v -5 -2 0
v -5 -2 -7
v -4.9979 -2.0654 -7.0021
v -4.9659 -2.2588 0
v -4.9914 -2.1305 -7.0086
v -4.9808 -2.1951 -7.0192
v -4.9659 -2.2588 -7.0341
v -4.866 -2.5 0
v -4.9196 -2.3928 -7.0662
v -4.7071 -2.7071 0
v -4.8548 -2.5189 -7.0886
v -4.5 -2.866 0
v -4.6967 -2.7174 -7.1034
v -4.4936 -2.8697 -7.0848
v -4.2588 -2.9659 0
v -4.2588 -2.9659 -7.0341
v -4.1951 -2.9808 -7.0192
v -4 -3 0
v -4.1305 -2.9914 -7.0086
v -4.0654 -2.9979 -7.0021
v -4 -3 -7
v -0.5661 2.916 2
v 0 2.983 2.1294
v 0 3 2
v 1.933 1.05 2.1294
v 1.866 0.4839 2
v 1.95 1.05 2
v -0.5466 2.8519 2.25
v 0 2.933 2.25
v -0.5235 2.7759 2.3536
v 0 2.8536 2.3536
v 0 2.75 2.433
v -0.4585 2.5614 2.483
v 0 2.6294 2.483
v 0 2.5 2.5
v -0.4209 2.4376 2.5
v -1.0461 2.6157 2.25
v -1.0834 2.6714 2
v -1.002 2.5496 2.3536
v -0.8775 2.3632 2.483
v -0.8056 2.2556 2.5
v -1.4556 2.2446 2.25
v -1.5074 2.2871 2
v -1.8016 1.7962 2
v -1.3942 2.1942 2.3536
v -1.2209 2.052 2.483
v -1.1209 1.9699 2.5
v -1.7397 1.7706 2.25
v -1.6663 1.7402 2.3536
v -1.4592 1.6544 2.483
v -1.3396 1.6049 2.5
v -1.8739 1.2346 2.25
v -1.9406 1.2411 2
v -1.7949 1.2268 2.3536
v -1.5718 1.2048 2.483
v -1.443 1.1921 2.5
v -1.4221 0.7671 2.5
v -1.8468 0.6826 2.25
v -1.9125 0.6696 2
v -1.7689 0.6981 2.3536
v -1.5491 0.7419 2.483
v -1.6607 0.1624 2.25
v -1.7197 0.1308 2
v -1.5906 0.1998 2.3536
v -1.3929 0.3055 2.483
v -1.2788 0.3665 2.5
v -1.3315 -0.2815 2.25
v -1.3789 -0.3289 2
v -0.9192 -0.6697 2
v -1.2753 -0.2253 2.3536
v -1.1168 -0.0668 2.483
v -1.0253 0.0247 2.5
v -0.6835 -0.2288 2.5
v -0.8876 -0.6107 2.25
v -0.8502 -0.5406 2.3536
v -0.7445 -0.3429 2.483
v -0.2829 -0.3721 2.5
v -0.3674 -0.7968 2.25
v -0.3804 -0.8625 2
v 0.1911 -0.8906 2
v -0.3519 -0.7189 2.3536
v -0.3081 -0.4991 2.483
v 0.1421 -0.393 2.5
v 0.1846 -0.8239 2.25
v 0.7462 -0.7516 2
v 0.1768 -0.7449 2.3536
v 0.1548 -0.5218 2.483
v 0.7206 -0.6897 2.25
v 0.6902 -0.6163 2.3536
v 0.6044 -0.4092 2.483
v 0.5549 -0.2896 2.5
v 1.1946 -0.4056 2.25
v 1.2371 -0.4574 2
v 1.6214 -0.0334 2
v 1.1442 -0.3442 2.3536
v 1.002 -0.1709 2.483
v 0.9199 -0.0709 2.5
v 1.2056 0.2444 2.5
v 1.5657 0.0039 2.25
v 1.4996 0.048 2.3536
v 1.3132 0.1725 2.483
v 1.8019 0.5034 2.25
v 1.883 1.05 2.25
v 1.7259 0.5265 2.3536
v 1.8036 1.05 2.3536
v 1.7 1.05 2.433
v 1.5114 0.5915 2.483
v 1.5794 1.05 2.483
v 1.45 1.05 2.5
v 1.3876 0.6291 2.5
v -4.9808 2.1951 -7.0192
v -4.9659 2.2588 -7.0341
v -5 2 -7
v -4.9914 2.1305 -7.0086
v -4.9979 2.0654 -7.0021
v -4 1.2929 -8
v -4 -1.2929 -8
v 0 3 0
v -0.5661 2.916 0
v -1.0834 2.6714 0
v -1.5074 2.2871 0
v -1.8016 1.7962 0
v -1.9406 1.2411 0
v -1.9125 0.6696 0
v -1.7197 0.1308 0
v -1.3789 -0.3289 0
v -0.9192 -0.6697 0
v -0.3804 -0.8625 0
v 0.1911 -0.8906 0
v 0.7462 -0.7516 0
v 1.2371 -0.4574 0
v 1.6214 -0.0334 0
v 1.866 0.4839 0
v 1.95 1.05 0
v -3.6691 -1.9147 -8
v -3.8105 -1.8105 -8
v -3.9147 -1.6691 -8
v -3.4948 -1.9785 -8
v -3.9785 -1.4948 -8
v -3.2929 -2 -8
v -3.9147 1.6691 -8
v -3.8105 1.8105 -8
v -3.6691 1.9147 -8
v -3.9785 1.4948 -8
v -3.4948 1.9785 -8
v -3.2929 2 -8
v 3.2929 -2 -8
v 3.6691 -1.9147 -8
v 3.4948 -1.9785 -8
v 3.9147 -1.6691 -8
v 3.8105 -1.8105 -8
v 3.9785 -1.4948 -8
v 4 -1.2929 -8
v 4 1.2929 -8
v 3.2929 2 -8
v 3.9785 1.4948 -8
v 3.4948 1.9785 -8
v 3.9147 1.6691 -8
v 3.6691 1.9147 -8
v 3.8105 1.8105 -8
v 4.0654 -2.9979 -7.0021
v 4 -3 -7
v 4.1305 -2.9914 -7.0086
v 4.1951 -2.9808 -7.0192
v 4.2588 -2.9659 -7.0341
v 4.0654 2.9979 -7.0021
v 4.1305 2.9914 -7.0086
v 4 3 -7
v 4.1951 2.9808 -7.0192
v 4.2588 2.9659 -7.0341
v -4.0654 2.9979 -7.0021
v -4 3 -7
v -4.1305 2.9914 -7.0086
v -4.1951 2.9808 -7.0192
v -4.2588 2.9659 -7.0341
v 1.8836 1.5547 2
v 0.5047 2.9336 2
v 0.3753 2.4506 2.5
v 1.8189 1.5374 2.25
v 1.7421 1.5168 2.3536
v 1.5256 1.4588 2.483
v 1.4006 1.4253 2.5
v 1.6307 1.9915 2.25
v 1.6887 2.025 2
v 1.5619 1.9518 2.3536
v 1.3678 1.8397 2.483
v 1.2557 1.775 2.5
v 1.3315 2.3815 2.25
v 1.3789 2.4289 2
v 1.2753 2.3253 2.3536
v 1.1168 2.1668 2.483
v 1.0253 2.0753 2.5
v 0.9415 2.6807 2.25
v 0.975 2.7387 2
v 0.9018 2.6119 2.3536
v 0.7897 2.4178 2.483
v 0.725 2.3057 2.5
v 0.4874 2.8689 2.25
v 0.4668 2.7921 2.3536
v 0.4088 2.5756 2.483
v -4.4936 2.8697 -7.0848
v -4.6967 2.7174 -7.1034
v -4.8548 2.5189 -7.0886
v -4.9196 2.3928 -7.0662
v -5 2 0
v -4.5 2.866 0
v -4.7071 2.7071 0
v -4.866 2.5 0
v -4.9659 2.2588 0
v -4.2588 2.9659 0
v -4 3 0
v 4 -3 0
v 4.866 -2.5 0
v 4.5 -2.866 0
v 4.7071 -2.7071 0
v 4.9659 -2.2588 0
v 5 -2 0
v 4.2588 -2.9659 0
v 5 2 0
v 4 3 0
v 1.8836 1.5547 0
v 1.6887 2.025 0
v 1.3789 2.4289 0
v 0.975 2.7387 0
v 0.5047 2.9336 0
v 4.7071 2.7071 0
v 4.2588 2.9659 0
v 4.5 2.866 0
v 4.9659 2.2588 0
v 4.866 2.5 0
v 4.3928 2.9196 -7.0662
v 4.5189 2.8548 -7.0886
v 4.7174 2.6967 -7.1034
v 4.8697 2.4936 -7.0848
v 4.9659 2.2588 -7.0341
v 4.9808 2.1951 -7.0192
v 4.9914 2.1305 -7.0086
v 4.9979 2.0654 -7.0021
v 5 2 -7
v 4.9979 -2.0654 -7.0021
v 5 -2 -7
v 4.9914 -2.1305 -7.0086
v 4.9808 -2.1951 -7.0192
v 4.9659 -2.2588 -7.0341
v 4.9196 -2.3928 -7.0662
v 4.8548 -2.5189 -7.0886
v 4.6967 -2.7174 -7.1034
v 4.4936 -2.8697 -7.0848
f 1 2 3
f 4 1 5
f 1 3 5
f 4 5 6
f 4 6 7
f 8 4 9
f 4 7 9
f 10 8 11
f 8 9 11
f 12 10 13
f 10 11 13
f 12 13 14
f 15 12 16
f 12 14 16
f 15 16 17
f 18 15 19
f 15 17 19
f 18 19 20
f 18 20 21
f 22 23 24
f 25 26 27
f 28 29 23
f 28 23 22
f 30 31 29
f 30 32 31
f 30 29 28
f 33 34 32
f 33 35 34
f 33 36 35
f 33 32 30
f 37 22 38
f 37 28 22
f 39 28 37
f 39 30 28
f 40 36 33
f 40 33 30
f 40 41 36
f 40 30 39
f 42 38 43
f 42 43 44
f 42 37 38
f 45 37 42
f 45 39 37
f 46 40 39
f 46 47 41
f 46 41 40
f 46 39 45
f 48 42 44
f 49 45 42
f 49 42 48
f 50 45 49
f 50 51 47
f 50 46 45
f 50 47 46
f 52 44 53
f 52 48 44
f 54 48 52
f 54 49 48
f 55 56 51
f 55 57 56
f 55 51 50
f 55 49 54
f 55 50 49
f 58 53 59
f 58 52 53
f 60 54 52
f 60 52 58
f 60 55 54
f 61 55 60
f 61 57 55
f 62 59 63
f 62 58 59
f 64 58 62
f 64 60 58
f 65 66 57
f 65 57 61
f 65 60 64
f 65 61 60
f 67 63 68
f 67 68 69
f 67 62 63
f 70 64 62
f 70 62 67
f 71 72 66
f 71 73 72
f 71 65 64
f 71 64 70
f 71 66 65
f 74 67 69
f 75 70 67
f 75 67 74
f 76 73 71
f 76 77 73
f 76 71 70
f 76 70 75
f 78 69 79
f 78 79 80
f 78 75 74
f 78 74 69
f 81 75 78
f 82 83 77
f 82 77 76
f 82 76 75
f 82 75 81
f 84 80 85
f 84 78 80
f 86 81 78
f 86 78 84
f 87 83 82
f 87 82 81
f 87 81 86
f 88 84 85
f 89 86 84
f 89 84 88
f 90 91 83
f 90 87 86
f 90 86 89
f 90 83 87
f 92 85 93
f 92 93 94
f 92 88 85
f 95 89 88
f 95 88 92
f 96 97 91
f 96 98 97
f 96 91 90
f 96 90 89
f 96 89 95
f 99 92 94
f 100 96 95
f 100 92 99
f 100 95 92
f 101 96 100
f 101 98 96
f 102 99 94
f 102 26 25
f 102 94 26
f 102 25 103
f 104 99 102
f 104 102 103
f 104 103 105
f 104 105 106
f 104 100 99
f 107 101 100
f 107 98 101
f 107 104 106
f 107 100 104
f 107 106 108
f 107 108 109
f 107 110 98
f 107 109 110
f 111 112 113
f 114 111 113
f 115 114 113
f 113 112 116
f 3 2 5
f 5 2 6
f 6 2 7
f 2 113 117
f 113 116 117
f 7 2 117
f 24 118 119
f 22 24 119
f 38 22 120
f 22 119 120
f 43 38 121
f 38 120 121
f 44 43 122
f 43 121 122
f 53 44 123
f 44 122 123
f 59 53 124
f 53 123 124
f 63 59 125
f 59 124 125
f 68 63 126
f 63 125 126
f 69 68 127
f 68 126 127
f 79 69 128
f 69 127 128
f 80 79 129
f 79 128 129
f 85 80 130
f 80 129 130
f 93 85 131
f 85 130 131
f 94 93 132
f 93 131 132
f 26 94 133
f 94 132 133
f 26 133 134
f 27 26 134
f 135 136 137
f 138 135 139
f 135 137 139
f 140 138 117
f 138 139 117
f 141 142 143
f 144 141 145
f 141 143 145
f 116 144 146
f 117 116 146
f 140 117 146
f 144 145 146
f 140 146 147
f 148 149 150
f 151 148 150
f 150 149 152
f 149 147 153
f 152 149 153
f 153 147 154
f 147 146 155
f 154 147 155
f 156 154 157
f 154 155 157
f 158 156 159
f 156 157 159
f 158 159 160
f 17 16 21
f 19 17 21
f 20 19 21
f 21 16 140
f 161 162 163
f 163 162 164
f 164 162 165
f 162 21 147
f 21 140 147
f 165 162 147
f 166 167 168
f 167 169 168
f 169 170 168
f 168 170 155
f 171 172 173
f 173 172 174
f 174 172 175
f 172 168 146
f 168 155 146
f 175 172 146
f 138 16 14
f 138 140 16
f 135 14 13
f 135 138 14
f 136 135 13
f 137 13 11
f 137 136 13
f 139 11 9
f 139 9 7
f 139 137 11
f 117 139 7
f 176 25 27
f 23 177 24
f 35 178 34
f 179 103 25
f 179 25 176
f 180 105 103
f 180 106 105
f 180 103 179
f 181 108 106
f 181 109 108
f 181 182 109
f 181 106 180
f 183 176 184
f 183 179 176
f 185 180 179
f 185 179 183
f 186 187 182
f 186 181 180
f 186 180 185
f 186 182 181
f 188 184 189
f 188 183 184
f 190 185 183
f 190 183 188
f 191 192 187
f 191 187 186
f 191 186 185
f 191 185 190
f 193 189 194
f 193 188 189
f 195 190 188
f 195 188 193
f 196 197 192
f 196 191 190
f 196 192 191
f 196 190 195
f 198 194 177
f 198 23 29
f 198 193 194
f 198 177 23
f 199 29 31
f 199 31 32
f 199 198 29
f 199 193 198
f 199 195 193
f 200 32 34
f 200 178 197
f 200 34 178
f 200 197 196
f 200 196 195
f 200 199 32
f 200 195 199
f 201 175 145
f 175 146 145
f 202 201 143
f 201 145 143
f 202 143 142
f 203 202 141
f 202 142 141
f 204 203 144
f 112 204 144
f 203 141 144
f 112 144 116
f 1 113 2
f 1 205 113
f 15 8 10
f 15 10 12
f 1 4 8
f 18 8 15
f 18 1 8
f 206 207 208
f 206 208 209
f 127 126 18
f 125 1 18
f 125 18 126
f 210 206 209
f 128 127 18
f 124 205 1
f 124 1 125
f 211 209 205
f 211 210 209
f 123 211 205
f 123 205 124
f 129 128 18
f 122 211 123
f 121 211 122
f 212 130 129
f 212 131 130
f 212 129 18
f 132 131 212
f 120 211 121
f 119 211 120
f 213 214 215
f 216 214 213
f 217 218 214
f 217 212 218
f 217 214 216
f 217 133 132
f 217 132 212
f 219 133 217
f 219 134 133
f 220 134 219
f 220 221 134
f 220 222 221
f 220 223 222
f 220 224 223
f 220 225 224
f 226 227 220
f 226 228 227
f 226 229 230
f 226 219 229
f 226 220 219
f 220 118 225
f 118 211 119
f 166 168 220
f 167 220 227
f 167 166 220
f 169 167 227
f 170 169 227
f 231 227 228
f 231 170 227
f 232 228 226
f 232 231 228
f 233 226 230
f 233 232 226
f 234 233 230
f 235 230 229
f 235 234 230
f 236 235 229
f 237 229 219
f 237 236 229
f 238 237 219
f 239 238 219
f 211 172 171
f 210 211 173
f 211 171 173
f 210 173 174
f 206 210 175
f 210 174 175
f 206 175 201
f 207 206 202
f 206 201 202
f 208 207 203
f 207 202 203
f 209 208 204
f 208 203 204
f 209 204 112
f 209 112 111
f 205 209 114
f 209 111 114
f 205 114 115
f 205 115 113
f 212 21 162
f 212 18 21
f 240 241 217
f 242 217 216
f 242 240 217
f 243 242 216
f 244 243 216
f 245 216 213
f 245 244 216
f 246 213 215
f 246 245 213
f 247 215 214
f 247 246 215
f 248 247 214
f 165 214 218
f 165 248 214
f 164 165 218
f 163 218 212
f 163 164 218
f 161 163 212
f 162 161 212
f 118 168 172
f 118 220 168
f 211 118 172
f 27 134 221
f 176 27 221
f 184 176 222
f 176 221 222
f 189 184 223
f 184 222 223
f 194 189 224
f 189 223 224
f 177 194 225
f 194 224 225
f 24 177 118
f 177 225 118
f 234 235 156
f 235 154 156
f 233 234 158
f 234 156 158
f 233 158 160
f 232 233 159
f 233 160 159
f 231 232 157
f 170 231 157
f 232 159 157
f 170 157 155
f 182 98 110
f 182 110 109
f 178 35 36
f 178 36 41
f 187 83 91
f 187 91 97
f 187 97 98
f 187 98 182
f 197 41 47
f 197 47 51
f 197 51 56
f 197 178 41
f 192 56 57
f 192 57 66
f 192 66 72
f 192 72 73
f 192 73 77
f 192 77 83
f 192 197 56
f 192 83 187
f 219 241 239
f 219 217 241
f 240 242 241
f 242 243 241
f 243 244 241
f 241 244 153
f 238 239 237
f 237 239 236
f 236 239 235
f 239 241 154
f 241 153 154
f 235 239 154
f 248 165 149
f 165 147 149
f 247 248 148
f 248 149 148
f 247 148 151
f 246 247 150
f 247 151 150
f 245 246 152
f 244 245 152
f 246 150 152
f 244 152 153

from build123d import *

# Parameters (mm, degrees)
F1_DEPTH = 8
F2_DEPTH = 2.5
F3_R     = 0.5
F4_SIZE  = 1
F5_F1_R  = 1
F5_F2_R  = 1
F5_F3_R  = 1
F5_F4_R  = 1
F5_F5_R  = 1
F5_F6_R  = 1
F5_F7_R  = 1
F5_F8_R  = 1


with BuildPart() as f1:
    # F0 (on Top) → F1 (new body)
    with BuildSketch(Plane.XY):
        Polygon((-5, -3), (5, -3), (5, 3), (0, 3), (-5, 3), align=None)
        with BuildLine():
            ThreePointArc((1.95, 1.05), (-1.3788582233, -0.3288582233), (0, 3))
            ThreePointArc((0, 3), (1.3788582233, 2.4288582233), (1.95, 1.05))
        make_face(mode=Mode.SUBTRACT)
        with BuildLine():
            ThreePointArc((1.95, 1.05), (1.3788582233, 2.4288582233), (0, 3))
            ThreePointArc((0, 3), (-1.3788582233, -0.3288582233), (1.95, 1.05))
        make_face()
    extrude(amount=-F1_DEPTH)

    # F0 (on Top) → F2 (join)
    with BuildSketch(Plane.XY):
        with BuildLine():
            ThreePointArc((1.95, 1.05), (1.3788582233, 2.4288582233), (0, 3))
            ThreePointArc((0, 3), (-1.3788582233, -0.3288582233), (1.95, 1.05))
        make_face()
    extrude(amount=F2_DEPTH)

    # F3
    f3_edges = [f1.edges().sort_by_distance(p)[0] for p in [
        (-1.95, 1.05, 2.5),
    ]]
    fillet(f3_edges, radius=F3_R)

    # F4
    f4_edges = [f1.edges().sort_by_distance(p)[0] for p in [
        (-5, 0, -8),
        (0, -3, -8),
        (0, 3, -8),
        (5, 0, -8),
    ]]
    chamfer(f4_edges, length=F4_SIZE)

    # F5: fillet of radius 1 on 8 edges, made by hand

    # F5_f1
    f5_f1_edges = [f1.edges().sort_by_distance(p)[0] for p in [
        (5, 3, -3.5),
    ]]
    fillet(f5_f1_edges, radius=F5_F1_R)

    # F5_f2
    f5_f2_edges = [f1.edges().sort_by_distance(p)[0] for p in [
        (-5, 3, -3.5),
    ]]
    fillet(f5_f2_edges, radius=F5_F2_R)

    # F5_f3
    f5_f3_edges = [f1.edges().sort_by_distance(p)[0] for p in [
        (5, -3, -3.5),
    ]]
    fillet(f5_f3_edges, radius=F5_F3_R)

    # F5_f4
    f5_f4_edges = [f1.edges().sort_by_distance(p)[0] for p in [
        (4.3535533906, 2.3535533906, -7.6464466094),
    ]]
    fillet(f5_f4_edges, radius=F5_F4_R)

    # F5_f5
    f5_f5_edges = [f1.edges().sort_by_distance(p)[0] for p in [
        (-4.3535533906, 2.3535533906, -7.6464466094),
    ]]
    fillet(f5_f5_edges, radius=F5_F5_R)

    # F5_f6
    f5_f6_edges = [f1.edges().sort_by_distance(p)[0] for p in [
        (-5, -3, -3.5),
    ]]
    fillet(f5_f6_edges, radius=F5_F6_R)

    # F5_f7
    f5_f7_edges = [f1.edges().sort_by_distance(p)[0] for p in [
        (4.3535533906, -2.3535533906, -7.6464466094),
    ]]
    fillet(f5_f7_edges, radius=F5_F7_R)

    # F5_f8
    f5_f8_edges = [f1.edges().sort_by_distance(p)[0] for p in [
        (-4.3535533906, -2.3535533906, -7.6464466094),
    ]]
    fillet(f5_f8_edges, radius=F5_F8_R)


solid = f1.part
